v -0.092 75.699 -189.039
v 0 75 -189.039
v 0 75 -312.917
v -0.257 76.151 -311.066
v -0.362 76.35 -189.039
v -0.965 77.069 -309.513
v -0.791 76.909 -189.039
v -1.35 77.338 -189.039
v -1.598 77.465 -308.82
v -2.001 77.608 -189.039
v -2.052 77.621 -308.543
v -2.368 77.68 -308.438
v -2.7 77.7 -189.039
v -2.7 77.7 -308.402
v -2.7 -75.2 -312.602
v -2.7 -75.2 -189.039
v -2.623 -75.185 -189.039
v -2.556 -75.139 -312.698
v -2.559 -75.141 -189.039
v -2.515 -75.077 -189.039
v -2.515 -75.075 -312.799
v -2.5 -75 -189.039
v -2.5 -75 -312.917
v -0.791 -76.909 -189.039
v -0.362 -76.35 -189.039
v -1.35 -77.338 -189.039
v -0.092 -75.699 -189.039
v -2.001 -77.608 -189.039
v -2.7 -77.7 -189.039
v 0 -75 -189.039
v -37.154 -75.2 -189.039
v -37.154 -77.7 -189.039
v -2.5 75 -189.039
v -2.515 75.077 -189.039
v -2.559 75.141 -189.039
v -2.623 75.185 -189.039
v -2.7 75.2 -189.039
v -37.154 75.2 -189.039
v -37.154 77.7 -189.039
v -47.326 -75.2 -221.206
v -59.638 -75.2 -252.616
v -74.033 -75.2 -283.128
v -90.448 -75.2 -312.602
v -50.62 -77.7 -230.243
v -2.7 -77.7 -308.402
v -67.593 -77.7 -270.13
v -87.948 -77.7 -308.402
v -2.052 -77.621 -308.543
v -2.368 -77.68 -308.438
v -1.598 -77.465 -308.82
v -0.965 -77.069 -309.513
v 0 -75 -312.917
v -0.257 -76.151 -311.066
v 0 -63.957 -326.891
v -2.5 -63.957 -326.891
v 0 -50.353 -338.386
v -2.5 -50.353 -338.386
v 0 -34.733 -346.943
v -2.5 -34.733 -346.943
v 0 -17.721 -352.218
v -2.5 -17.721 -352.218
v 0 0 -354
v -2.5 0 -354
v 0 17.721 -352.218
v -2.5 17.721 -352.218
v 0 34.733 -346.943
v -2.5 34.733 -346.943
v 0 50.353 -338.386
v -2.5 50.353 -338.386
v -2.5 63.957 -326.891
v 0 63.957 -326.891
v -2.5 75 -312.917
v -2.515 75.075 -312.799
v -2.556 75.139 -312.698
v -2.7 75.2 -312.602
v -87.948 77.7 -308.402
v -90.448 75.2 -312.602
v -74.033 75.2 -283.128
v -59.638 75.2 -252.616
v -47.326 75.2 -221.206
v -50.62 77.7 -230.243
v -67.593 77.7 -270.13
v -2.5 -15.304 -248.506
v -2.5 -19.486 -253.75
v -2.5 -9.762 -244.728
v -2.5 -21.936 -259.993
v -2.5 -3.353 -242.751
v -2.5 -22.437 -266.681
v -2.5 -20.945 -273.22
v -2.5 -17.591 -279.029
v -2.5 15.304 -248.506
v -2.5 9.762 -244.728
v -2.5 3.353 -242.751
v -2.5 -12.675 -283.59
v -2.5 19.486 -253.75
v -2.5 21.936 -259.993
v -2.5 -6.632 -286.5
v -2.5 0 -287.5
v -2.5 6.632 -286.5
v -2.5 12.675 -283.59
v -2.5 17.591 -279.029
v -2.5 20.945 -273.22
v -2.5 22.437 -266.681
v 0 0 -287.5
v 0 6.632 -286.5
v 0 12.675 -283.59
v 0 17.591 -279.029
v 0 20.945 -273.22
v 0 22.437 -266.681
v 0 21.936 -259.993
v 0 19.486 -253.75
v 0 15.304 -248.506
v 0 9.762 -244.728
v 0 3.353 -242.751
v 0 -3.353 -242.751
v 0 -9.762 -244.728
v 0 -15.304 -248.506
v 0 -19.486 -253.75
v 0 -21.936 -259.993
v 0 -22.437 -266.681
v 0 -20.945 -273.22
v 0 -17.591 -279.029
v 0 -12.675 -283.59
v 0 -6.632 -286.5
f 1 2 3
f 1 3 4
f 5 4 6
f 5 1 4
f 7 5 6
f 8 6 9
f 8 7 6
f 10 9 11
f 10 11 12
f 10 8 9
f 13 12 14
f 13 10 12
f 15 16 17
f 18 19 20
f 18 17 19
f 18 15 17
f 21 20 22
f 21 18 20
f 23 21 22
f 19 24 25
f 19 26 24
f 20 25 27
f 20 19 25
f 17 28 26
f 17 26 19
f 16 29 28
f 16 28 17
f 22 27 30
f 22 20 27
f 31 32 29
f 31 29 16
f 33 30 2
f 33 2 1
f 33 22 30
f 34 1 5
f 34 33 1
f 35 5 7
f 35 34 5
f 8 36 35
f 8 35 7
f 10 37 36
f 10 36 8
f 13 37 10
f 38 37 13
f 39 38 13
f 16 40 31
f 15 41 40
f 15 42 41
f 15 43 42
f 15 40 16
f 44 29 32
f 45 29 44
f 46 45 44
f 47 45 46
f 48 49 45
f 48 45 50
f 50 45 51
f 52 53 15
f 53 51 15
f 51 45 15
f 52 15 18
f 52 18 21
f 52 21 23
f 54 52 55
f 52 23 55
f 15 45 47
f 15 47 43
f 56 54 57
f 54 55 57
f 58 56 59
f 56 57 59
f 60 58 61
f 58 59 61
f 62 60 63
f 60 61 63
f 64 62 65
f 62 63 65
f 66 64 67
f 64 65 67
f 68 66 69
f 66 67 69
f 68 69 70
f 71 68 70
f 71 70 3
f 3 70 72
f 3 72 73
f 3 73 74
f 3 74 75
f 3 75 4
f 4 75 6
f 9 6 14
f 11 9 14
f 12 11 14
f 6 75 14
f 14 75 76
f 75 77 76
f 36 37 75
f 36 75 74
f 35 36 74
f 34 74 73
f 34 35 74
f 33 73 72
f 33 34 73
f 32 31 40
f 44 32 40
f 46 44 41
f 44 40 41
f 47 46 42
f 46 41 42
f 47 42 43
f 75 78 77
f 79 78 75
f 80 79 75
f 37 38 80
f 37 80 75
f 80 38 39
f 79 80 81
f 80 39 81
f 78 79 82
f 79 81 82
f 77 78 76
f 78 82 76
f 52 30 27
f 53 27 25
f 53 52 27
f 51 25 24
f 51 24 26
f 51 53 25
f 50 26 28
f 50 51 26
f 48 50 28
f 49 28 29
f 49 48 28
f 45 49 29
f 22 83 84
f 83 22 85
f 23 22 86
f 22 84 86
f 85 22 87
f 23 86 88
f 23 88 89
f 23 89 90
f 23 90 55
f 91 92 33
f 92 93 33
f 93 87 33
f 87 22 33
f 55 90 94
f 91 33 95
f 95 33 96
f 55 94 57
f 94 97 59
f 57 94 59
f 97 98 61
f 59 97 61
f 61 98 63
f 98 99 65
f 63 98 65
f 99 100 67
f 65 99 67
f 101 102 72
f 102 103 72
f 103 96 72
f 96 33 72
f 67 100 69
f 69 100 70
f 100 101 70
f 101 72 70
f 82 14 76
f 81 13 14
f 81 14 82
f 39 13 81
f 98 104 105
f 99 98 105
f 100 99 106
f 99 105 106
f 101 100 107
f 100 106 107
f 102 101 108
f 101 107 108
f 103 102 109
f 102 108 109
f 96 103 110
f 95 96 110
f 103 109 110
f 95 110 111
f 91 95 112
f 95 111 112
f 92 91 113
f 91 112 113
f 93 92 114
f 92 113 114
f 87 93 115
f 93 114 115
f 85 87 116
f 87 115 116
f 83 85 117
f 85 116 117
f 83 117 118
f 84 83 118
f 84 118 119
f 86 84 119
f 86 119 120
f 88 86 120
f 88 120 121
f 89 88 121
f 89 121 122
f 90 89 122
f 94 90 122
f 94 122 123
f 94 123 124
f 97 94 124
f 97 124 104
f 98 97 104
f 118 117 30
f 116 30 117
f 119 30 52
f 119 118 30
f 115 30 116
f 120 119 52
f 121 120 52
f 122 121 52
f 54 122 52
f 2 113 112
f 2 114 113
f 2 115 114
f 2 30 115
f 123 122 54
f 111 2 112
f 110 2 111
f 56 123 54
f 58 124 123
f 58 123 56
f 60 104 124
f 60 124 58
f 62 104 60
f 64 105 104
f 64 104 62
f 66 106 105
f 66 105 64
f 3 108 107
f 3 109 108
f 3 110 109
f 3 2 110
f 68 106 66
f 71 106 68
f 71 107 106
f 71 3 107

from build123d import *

# Parameters (mm, degrees)
SKETCH1_W               = 730
SKETCH1_H               = 150
BASE_FLANGE1_DEPTH      = 2.5
EDGE_FLANGE1_DEPTH      = 730
EDGE_FLANGE1_BEND_DEPTH = 730
SKETCH13_R              = 22.5
CUT_EXTRUDE2_DEPTH      = 10
CUT_EXTRUDE3_DEPTH      = 396.173746598
CUT_EXTRUDE3_DEPTH_BACK = 396.173746598
SKETCH14_W              = 631.337566112
SKETCH14_H              = 273.157514278
CUT_EXTRUDE4_DEPTH      = 396.173746598
CUT_EXTRUDE4_DEPTH_BACK = 396.173746598
CUT_EXTRUDE5_DEPTH      = 408.87885472


# Sheet-metal steps are written as plain solids
with BuildPart() as part:
    # Sketch1 → Base-Flange1 (new body)
    with BuildSketch(Plane(origin=(0, 0, 0), x_dir=(0, 0, -1), z_dir=(1, 0, 0))):
        Rectangle(SKETCH1_W, SKETCH1_H)
    extrude(amount=-BASE_FLANGE1_DEPTH)

    # Edge-Flange1 section (across the edge) → Edge-Flange1 (add)
    with BuildSketch(Plane(origin=(-2.5, 75.2, 365), x_dir=(0, -1, 0), z_dir=(0, 0, -1))):
        with BuildLine():
            Line((-2.5, 0.2), (-2.5, 127.5))
            Line((-2.5, 127.5), (0, 127.5))
            Line((0, 127.5), (0, 0.2))
            ThreePointArc((0, 0.2), (0.058578644, 0.058578644), (0.2, 0))
            Line((0.2, 0), (0.2, -2.5))
            ThreePointArc((0.2, -2.5), (-1.709188309, -1.709188309), (-2.5, 0.2))
        make_face()
    extrude(amount=EDGE_FLANGE1_DEPTH)

    # Edge-Flange1 section 2 (across the edge) → Edge-Flange1 bend (add)
    with BuildSketch(Plane(origin=(-2.5, -75.2, -365), x_dir=(0, 1, 0), z_dir=(0, 0, 1))):
        with BuildLine():
            Line((-2.5, 0.2), (-2.5, 127.5))
            Line((-2.5, 127.5), (0, 127.5))
            Line((0, 127.5), (0, 0.2))
            ThreePointArc((0, 0.2), (0.058578644, 0.058578644), (0.2, 0))
            Line((0.2, 0), (0.2, -2.5))
            ThreePointArc((0.2, -2.5), (-1.709188309, -1.709188309), (-2.5, 0.2))
        make_face()
    extrude(amount=EDGE_FLANGE1_BEND_DEPTH)

    # Sketch13 → Cut-Extrude2 (cut)
    with BuildSketch(Plane(origin=(0, 0, 0), x_dir=(0, 0, -1), z_dir=(1, 0, 0))):
        with Locations((265, 0)):
            Circle(SKETCH13_R)
        with Locations((-290, 0)):
            Circle(SKETCH13_R)
    extrude(amount=-CUT_EXTRUDE2_DEPTH, mode=Mode.SUBTRACT)

    # Sketch14 → Cut-Extrude3 (cut, two sides: drawn at the far end of the back side and taken through both)
    with BuildSketch(Plane(origin=(0, 0, 0), x_dir=(0, 0, -1), z_dir=(1, 0, 0)).offset(-CUT_EXTRUDE3_DEPTH_BACK)):
        with Locations((-126.629311255, -14.019673746)):
            Rectangle(SKETCH14_W, SKETCH14_H)
    extrude(amount=CUT_EXTRUDE3_DEPTH + CUT_EXTRUDE3_DEPTH_BACK, mode=Mode.SUBTRACT)

    # Sketch15 → Cut-Extrude4 (cut, two sides: drawn at the far end of the back side and taken through both)
    with BuildSketch(Plane(origin=(0, 0, 0), x_dir=(0, 0, -1), z_dir=(1, 0, 0)).offset(-CUT_EXTRUDE4_DEPTH_BACK)):
        with BuildLine():
            Line((302.266550641, 80.822052704), (310.532003477, 105.351783703))
            Line((310.532003477, 105.351783703), (400.668447303, 94.566226322))
            Line((400.668447303, 94.566226322), (380.252927975, -108.048173048))
            Line((380.252927975, -108.048173048), (291.286888445, -85.029403714))
            ThreePointArc((291.286888445, -85.029403714), (353.805609642, -5.879089735), (302.266550641, 80.822052704))
        make_face()
    extrude(amount=CUT_EXTRUDE4_DEPTH + CUT_EXTRUDE4_DEPTH_BACK, mode=Mode.SUBTRACT)

    # Sketch17 → Cut-Extrude5 (cut, through all)
    with BuildSketch(Plane(origin=(0, 77.7, 0), x_dir=(1, 0, 0), z_dir=(0, 1, 0))):
        with BuildLine():
            Line((-118.819244886, 354.751470834), (-213.837944087, 354.751470834))
            Line((-213.837944087, 354.751470834), (-213.837944087, 158.380448287))
            Line((-213.837944087, 158.380448287), (-29.613553222, 158.380448287))
            ThreePointArc((-29.613553222, 158.380448287), (-63.53464157, 261.418373894), (-118.819244886, 354.751470834))
        make_face()
    extrude(amount=-CUT_EXTRUDE5_DEPTH, mode=Mode.SUBTRACT)


solid = part.part
